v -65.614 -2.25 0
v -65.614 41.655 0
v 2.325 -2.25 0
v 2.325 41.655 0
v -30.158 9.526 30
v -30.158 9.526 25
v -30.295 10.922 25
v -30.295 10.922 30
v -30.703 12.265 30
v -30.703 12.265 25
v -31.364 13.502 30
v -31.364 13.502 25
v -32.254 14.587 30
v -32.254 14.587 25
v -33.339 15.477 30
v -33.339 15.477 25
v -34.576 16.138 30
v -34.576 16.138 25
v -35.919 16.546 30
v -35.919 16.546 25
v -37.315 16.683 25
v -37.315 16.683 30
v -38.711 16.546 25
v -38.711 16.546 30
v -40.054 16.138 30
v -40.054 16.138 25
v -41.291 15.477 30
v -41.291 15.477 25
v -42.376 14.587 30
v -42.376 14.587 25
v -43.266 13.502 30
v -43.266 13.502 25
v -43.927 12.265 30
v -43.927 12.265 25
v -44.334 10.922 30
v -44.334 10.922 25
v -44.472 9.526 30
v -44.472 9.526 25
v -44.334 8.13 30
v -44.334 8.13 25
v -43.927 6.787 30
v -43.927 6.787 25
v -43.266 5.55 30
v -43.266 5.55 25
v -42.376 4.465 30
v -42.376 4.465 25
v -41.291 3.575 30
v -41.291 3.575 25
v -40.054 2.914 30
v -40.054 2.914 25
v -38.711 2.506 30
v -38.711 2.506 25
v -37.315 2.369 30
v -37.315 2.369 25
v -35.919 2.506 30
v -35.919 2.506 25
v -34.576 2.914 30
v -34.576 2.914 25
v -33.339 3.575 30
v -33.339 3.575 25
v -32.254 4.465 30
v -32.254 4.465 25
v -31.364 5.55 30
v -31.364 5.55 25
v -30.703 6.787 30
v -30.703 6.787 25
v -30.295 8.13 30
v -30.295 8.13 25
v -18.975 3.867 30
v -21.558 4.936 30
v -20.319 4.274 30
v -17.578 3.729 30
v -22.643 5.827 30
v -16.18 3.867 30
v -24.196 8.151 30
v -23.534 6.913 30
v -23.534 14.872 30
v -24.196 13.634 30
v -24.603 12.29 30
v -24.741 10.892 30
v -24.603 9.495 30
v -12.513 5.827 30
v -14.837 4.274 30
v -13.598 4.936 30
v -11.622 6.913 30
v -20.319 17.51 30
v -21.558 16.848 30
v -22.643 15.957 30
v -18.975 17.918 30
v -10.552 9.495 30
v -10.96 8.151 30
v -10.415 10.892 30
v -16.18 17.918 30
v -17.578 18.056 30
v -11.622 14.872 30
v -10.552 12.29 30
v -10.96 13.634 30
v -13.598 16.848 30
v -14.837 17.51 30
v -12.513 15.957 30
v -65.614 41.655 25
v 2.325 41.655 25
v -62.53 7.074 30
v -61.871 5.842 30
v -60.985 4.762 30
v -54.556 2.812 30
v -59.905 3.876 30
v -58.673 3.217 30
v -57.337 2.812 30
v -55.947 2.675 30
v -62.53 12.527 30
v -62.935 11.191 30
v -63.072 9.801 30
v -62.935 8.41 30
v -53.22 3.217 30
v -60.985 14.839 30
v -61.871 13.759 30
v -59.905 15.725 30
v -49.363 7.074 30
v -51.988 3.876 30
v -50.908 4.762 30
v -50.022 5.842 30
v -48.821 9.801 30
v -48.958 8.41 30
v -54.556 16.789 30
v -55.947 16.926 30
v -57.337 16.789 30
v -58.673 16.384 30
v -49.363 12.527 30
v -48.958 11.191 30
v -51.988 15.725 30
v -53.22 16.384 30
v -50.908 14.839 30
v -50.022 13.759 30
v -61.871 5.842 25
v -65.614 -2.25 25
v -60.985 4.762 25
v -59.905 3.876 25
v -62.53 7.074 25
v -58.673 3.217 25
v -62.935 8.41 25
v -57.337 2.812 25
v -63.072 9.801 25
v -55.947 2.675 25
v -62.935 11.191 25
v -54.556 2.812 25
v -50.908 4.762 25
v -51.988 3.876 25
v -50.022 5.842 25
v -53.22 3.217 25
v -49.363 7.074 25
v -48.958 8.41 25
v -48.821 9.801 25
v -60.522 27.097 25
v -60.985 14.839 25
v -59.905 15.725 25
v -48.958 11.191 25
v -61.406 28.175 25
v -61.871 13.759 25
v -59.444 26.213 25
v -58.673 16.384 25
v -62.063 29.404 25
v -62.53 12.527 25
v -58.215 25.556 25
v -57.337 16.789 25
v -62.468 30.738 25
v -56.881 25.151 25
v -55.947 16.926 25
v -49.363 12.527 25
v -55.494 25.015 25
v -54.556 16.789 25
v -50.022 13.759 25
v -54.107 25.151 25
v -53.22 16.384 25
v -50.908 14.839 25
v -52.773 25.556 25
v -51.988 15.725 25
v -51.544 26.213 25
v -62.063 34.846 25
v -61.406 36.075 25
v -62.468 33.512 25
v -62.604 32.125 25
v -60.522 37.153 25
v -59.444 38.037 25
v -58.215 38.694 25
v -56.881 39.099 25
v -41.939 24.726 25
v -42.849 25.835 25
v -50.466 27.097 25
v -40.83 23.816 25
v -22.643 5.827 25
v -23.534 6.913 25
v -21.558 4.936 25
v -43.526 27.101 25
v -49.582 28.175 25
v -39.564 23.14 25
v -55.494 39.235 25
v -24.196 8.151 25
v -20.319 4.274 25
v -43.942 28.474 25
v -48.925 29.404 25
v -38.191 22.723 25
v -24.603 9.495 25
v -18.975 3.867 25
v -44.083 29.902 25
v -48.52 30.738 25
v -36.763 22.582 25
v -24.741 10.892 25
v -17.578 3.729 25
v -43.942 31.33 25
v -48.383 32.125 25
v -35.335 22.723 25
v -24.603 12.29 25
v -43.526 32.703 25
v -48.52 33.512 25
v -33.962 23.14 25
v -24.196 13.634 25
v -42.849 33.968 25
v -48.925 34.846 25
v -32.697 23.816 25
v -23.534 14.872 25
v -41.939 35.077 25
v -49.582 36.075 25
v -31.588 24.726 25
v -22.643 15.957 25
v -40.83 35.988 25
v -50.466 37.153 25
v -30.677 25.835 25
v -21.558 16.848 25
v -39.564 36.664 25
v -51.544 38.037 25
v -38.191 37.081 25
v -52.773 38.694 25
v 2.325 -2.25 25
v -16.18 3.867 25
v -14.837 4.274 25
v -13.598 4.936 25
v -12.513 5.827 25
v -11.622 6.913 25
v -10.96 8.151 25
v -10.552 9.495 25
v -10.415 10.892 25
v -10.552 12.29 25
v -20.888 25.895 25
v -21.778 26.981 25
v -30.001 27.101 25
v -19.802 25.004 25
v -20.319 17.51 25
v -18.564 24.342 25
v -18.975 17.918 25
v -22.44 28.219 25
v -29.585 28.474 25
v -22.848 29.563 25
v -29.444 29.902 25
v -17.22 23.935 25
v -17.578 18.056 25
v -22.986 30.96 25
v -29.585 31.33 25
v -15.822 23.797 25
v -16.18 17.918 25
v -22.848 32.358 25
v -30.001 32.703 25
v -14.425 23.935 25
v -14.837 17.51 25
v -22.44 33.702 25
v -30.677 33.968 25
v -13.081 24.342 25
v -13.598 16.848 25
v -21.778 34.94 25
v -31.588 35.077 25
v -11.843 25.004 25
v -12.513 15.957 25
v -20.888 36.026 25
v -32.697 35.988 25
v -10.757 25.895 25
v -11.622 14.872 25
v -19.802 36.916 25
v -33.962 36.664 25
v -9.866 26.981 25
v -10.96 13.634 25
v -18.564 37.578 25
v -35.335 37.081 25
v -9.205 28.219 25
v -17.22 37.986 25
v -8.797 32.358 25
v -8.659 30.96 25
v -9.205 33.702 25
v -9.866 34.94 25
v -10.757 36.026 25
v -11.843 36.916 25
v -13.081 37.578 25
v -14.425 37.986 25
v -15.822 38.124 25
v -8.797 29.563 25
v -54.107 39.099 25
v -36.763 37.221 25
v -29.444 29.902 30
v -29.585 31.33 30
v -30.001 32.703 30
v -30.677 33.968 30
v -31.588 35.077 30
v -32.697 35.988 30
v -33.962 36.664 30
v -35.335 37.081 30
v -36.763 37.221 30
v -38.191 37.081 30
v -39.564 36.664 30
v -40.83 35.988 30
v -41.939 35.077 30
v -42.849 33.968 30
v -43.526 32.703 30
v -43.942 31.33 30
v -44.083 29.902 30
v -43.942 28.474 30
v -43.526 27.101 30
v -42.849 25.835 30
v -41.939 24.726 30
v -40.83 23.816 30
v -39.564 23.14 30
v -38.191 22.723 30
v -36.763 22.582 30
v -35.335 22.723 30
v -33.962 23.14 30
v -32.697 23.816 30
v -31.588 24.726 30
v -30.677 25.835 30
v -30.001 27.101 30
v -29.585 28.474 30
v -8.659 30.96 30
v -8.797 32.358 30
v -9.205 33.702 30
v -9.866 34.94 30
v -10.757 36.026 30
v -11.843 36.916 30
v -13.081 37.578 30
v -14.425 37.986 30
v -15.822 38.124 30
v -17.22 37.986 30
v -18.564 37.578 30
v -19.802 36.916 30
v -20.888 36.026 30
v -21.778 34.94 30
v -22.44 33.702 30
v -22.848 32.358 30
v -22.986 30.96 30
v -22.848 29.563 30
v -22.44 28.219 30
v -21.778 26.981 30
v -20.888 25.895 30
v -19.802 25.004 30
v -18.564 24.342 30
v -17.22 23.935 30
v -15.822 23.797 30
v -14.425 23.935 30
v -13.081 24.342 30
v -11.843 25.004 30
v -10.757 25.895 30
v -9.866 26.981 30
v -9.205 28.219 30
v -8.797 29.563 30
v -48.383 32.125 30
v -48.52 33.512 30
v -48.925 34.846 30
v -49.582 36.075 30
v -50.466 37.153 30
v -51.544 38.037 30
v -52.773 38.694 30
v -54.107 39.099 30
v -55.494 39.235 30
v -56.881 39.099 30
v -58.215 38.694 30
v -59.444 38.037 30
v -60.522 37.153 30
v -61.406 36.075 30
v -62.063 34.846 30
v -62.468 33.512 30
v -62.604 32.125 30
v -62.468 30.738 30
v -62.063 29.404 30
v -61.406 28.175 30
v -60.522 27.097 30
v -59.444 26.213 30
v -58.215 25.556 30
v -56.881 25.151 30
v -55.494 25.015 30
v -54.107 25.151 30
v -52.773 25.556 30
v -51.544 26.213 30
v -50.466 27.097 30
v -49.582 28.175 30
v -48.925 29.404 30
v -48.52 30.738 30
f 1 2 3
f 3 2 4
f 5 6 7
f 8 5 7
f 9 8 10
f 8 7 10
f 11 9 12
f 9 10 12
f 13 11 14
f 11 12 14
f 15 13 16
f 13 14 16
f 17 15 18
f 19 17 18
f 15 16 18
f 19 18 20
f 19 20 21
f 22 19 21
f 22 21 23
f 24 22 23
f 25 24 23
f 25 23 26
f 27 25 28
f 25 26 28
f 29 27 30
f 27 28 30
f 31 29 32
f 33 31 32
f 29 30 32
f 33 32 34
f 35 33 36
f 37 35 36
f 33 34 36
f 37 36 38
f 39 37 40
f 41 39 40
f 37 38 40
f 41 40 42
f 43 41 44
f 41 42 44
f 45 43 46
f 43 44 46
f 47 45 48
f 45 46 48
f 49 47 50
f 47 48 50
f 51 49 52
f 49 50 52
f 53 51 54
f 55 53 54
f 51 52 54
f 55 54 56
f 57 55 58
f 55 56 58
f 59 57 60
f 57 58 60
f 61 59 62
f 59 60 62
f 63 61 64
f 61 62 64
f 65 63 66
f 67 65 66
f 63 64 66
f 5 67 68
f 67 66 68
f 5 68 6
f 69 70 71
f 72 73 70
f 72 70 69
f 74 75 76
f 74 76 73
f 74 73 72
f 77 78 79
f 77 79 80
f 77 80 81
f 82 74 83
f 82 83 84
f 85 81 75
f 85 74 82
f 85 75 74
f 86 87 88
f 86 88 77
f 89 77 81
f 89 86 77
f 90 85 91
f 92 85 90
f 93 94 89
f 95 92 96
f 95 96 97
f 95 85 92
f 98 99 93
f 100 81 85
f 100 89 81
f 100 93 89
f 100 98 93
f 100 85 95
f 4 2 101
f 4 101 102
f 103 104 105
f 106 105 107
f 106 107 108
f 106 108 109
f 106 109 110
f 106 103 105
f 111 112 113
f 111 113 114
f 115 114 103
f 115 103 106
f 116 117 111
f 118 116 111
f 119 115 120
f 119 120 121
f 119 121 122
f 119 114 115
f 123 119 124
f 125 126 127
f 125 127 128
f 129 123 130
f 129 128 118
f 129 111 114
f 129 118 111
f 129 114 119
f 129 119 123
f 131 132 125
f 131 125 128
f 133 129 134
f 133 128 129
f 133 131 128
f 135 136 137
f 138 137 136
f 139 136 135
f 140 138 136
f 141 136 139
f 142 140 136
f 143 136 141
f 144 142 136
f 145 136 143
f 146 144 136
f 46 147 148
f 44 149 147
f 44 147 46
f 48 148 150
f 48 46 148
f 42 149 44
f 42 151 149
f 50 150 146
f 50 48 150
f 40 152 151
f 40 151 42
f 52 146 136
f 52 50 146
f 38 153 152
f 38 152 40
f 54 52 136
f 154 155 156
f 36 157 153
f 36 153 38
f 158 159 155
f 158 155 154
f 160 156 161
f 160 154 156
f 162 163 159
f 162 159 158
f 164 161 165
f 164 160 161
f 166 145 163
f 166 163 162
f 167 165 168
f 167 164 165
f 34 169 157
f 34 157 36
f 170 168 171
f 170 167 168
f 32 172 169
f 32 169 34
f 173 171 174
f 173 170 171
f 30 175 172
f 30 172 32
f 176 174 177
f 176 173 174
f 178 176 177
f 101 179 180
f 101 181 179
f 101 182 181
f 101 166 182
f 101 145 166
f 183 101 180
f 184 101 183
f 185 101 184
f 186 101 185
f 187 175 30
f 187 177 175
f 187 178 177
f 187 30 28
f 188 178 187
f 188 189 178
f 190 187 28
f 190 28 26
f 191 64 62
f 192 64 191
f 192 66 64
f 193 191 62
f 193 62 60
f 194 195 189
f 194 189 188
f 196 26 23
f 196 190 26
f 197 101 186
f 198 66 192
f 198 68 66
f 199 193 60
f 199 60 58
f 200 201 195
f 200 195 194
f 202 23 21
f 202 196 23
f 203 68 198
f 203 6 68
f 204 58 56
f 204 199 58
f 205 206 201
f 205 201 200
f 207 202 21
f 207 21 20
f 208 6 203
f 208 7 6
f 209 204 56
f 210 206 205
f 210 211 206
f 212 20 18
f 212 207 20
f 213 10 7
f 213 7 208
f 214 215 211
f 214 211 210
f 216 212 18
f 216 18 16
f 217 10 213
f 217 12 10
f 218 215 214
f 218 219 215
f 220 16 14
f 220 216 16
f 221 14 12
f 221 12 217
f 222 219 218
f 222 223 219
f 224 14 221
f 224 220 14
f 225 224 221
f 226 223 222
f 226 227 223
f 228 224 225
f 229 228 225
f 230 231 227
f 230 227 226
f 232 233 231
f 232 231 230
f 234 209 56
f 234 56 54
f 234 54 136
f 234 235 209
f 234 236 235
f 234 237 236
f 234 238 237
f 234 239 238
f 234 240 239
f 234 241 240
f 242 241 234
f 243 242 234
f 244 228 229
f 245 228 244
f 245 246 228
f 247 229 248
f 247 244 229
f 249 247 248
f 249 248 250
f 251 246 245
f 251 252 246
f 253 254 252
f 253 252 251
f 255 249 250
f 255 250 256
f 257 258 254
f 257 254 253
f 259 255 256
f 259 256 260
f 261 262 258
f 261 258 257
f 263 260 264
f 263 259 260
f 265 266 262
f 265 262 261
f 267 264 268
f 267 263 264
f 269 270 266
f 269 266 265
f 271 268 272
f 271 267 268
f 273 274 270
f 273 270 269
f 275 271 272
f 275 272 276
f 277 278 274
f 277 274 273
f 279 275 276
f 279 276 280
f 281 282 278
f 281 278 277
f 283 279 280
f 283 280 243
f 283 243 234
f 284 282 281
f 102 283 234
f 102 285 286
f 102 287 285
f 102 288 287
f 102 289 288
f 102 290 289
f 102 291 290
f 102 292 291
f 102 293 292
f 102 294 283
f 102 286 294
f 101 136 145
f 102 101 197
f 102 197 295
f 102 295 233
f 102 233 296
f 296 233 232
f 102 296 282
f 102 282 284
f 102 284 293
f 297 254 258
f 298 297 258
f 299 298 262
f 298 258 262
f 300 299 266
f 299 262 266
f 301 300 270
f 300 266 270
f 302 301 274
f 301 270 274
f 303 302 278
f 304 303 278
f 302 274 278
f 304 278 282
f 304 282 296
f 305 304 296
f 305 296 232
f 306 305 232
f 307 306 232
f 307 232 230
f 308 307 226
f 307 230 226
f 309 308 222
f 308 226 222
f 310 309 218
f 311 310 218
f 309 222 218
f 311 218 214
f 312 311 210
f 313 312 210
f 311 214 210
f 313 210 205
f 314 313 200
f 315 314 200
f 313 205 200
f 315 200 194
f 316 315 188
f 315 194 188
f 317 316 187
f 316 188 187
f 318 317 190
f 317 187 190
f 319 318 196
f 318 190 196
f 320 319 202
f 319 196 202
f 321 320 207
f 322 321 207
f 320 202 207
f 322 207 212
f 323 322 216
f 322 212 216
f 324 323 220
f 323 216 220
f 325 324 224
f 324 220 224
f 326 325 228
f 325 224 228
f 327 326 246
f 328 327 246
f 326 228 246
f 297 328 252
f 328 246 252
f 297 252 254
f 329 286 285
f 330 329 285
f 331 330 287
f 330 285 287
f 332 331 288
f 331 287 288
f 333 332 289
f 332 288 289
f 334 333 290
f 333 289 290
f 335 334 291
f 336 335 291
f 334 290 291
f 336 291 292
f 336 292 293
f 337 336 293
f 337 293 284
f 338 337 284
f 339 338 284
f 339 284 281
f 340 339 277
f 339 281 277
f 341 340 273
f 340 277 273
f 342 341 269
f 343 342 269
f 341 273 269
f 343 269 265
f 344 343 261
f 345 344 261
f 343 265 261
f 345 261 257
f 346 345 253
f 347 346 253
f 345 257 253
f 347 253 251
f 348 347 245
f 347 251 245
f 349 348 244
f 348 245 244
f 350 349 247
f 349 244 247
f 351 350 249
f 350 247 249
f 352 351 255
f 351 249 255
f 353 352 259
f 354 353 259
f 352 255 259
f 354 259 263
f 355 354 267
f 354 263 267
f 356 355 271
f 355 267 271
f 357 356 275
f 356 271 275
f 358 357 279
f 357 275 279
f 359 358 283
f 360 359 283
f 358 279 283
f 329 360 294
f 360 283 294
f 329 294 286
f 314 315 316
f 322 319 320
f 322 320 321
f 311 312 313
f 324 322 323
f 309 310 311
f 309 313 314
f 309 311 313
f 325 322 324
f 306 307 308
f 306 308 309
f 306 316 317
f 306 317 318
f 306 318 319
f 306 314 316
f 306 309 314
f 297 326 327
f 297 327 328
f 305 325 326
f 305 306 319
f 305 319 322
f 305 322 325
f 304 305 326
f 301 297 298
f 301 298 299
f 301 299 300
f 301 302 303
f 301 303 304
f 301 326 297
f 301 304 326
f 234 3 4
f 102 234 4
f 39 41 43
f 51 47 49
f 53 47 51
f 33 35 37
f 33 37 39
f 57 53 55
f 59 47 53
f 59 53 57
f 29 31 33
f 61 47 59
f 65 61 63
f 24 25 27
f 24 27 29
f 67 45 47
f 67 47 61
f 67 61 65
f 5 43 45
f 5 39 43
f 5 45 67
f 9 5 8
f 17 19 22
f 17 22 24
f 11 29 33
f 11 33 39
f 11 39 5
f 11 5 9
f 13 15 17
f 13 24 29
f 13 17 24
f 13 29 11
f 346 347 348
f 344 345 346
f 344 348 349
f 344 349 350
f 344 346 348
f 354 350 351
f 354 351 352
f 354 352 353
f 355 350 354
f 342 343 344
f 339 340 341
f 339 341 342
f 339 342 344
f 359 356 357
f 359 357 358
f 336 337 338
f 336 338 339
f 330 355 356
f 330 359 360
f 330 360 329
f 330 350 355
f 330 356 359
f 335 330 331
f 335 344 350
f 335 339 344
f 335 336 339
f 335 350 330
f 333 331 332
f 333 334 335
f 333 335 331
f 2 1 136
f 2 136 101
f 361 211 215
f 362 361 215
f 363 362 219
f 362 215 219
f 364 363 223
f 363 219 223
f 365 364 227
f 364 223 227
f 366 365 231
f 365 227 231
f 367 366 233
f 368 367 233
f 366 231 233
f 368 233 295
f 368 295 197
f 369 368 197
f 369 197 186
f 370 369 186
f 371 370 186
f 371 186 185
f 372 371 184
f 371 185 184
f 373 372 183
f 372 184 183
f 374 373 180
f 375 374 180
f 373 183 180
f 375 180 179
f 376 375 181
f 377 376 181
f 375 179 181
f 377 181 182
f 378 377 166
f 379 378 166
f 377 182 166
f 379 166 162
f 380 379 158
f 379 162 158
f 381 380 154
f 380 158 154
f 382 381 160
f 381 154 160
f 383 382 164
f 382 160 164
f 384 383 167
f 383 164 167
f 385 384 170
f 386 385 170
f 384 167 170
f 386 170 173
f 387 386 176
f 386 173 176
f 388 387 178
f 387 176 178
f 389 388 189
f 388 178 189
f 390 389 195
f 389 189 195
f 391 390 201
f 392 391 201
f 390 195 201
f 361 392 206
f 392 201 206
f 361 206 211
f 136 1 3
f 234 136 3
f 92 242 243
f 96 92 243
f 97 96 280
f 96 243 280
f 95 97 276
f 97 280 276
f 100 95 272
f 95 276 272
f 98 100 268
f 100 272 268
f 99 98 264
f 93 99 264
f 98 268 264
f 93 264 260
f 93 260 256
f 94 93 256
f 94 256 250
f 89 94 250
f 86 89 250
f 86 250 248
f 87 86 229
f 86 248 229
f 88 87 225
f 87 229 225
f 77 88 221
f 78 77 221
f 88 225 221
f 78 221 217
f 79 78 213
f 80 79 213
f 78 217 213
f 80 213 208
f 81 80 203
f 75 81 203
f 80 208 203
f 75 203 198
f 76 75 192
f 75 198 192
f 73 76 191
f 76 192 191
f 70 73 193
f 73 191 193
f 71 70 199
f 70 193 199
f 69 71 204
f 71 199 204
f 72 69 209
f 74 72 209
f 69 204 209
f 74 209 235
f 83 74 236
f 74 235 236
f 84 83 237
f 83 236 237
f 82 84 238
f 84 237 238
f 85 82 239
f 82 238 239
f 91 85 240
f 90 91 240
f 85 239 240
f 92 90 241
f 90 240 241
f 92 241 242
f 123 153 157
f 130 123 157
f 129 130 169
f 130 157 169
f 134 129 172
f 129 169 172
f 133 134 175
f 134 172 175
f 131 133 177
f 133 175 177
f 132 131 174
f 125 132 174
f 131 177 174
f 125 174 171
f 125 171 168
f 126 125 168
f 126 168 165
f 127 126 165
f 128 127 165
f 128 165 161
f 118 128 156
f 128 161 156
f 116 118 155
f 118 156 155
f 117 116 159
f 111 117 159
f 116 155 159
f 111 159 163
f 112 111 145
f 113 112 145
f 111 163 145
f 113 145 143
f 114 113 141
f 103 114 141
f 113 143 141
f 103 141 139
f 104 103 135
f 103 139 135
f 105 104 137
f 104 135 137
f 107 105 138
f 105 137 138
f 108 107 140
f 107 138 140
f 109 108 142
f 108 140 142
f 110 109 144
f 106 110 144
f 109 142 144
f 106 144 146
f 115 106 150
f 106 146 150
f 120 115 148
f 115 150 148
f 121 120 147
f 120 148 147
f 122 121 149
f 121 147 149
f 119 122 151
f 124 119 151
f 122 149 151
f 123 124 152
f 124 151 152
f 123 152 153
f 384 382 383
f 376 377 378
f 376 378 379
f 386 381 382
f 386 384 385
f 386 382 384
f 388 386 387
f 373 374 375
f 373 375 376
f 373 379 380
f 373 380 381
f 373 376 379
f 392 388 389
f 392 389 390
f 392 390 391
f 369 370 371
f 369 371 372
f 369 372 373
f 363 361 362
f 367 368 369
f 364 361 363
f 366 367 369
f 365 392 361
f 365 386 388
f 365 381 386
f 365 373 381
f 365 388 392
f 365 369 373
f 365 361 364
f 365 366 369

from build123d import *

# Parameters (mm, degrees)
F0_W      = 67.939341
F0_H      = 43.90462
F1_DEPTH  = 25
F4_R      = 7.163185
F5_DEPTH  = 5
F2_R      = 7.125778
F6_DEPTH  = 5
F3_R      = 7.157073
F7_DEPTH  = 5
F8_R      = 7.110337
F11_DEPTH = 5
F9_R      = 7.319436
F10_R     = 7.163193
F12_DEPTH = 5


with BuildPart() as f1:
    # F0 (on Top) → F1 (new body)
    with BuildSketch(Plane.XY):
        with Locations((-31.644568, 19.702698)):
            Rectangle(F0_W, F0_H)
    extrude(amount=F1_DEPTH)

    # F4 (on face) → F5 (join)
    with BuildSketch(Plane.XY.offset(25)):
        with Locations((-17.577875, 10.892338)):
            Circle(F4_R)
    extrude(amount=F5_DEPTH)

    # F2 (on face) → F6 (join)
    with BuildSketch(Plane.XY.offset(25)):
        with Locations((-55.946503, 9.800529)):
            Circle(F2_R)
    extrude(amount=F6_DEPTH)

    # F3 (on face) → F7 (join)
    with BuildSketch(Plane.XY.offset(25)):
        with Locations((-37.314776, 9.52596)):
            Circle(F3_R)
    extrude(amount=F7_DEPTH)

    # F8 (on face) → F11 (join)
    with BuildSketch(Plane.XY.offset(25)):
        with Locations((-55.493828, 32.125078)):
            Circle(F8_R)
    extrude(amount=F11_DEPTH)

    # F9 (on face) + F10 (on face) → F12 (join)
    with BuildSketch(Plane.XY.offset(25)):
        with Locations((-36.76331, 29.901806)):
            Circle(F9_R)
    with BuildSketch(Plane.XY.offset(25)):
        with Locations((-15.822439, 30.960426)):
            Circle(F10_R)
    extrude(amount=F12_DEPTH)


solid = f1.part
